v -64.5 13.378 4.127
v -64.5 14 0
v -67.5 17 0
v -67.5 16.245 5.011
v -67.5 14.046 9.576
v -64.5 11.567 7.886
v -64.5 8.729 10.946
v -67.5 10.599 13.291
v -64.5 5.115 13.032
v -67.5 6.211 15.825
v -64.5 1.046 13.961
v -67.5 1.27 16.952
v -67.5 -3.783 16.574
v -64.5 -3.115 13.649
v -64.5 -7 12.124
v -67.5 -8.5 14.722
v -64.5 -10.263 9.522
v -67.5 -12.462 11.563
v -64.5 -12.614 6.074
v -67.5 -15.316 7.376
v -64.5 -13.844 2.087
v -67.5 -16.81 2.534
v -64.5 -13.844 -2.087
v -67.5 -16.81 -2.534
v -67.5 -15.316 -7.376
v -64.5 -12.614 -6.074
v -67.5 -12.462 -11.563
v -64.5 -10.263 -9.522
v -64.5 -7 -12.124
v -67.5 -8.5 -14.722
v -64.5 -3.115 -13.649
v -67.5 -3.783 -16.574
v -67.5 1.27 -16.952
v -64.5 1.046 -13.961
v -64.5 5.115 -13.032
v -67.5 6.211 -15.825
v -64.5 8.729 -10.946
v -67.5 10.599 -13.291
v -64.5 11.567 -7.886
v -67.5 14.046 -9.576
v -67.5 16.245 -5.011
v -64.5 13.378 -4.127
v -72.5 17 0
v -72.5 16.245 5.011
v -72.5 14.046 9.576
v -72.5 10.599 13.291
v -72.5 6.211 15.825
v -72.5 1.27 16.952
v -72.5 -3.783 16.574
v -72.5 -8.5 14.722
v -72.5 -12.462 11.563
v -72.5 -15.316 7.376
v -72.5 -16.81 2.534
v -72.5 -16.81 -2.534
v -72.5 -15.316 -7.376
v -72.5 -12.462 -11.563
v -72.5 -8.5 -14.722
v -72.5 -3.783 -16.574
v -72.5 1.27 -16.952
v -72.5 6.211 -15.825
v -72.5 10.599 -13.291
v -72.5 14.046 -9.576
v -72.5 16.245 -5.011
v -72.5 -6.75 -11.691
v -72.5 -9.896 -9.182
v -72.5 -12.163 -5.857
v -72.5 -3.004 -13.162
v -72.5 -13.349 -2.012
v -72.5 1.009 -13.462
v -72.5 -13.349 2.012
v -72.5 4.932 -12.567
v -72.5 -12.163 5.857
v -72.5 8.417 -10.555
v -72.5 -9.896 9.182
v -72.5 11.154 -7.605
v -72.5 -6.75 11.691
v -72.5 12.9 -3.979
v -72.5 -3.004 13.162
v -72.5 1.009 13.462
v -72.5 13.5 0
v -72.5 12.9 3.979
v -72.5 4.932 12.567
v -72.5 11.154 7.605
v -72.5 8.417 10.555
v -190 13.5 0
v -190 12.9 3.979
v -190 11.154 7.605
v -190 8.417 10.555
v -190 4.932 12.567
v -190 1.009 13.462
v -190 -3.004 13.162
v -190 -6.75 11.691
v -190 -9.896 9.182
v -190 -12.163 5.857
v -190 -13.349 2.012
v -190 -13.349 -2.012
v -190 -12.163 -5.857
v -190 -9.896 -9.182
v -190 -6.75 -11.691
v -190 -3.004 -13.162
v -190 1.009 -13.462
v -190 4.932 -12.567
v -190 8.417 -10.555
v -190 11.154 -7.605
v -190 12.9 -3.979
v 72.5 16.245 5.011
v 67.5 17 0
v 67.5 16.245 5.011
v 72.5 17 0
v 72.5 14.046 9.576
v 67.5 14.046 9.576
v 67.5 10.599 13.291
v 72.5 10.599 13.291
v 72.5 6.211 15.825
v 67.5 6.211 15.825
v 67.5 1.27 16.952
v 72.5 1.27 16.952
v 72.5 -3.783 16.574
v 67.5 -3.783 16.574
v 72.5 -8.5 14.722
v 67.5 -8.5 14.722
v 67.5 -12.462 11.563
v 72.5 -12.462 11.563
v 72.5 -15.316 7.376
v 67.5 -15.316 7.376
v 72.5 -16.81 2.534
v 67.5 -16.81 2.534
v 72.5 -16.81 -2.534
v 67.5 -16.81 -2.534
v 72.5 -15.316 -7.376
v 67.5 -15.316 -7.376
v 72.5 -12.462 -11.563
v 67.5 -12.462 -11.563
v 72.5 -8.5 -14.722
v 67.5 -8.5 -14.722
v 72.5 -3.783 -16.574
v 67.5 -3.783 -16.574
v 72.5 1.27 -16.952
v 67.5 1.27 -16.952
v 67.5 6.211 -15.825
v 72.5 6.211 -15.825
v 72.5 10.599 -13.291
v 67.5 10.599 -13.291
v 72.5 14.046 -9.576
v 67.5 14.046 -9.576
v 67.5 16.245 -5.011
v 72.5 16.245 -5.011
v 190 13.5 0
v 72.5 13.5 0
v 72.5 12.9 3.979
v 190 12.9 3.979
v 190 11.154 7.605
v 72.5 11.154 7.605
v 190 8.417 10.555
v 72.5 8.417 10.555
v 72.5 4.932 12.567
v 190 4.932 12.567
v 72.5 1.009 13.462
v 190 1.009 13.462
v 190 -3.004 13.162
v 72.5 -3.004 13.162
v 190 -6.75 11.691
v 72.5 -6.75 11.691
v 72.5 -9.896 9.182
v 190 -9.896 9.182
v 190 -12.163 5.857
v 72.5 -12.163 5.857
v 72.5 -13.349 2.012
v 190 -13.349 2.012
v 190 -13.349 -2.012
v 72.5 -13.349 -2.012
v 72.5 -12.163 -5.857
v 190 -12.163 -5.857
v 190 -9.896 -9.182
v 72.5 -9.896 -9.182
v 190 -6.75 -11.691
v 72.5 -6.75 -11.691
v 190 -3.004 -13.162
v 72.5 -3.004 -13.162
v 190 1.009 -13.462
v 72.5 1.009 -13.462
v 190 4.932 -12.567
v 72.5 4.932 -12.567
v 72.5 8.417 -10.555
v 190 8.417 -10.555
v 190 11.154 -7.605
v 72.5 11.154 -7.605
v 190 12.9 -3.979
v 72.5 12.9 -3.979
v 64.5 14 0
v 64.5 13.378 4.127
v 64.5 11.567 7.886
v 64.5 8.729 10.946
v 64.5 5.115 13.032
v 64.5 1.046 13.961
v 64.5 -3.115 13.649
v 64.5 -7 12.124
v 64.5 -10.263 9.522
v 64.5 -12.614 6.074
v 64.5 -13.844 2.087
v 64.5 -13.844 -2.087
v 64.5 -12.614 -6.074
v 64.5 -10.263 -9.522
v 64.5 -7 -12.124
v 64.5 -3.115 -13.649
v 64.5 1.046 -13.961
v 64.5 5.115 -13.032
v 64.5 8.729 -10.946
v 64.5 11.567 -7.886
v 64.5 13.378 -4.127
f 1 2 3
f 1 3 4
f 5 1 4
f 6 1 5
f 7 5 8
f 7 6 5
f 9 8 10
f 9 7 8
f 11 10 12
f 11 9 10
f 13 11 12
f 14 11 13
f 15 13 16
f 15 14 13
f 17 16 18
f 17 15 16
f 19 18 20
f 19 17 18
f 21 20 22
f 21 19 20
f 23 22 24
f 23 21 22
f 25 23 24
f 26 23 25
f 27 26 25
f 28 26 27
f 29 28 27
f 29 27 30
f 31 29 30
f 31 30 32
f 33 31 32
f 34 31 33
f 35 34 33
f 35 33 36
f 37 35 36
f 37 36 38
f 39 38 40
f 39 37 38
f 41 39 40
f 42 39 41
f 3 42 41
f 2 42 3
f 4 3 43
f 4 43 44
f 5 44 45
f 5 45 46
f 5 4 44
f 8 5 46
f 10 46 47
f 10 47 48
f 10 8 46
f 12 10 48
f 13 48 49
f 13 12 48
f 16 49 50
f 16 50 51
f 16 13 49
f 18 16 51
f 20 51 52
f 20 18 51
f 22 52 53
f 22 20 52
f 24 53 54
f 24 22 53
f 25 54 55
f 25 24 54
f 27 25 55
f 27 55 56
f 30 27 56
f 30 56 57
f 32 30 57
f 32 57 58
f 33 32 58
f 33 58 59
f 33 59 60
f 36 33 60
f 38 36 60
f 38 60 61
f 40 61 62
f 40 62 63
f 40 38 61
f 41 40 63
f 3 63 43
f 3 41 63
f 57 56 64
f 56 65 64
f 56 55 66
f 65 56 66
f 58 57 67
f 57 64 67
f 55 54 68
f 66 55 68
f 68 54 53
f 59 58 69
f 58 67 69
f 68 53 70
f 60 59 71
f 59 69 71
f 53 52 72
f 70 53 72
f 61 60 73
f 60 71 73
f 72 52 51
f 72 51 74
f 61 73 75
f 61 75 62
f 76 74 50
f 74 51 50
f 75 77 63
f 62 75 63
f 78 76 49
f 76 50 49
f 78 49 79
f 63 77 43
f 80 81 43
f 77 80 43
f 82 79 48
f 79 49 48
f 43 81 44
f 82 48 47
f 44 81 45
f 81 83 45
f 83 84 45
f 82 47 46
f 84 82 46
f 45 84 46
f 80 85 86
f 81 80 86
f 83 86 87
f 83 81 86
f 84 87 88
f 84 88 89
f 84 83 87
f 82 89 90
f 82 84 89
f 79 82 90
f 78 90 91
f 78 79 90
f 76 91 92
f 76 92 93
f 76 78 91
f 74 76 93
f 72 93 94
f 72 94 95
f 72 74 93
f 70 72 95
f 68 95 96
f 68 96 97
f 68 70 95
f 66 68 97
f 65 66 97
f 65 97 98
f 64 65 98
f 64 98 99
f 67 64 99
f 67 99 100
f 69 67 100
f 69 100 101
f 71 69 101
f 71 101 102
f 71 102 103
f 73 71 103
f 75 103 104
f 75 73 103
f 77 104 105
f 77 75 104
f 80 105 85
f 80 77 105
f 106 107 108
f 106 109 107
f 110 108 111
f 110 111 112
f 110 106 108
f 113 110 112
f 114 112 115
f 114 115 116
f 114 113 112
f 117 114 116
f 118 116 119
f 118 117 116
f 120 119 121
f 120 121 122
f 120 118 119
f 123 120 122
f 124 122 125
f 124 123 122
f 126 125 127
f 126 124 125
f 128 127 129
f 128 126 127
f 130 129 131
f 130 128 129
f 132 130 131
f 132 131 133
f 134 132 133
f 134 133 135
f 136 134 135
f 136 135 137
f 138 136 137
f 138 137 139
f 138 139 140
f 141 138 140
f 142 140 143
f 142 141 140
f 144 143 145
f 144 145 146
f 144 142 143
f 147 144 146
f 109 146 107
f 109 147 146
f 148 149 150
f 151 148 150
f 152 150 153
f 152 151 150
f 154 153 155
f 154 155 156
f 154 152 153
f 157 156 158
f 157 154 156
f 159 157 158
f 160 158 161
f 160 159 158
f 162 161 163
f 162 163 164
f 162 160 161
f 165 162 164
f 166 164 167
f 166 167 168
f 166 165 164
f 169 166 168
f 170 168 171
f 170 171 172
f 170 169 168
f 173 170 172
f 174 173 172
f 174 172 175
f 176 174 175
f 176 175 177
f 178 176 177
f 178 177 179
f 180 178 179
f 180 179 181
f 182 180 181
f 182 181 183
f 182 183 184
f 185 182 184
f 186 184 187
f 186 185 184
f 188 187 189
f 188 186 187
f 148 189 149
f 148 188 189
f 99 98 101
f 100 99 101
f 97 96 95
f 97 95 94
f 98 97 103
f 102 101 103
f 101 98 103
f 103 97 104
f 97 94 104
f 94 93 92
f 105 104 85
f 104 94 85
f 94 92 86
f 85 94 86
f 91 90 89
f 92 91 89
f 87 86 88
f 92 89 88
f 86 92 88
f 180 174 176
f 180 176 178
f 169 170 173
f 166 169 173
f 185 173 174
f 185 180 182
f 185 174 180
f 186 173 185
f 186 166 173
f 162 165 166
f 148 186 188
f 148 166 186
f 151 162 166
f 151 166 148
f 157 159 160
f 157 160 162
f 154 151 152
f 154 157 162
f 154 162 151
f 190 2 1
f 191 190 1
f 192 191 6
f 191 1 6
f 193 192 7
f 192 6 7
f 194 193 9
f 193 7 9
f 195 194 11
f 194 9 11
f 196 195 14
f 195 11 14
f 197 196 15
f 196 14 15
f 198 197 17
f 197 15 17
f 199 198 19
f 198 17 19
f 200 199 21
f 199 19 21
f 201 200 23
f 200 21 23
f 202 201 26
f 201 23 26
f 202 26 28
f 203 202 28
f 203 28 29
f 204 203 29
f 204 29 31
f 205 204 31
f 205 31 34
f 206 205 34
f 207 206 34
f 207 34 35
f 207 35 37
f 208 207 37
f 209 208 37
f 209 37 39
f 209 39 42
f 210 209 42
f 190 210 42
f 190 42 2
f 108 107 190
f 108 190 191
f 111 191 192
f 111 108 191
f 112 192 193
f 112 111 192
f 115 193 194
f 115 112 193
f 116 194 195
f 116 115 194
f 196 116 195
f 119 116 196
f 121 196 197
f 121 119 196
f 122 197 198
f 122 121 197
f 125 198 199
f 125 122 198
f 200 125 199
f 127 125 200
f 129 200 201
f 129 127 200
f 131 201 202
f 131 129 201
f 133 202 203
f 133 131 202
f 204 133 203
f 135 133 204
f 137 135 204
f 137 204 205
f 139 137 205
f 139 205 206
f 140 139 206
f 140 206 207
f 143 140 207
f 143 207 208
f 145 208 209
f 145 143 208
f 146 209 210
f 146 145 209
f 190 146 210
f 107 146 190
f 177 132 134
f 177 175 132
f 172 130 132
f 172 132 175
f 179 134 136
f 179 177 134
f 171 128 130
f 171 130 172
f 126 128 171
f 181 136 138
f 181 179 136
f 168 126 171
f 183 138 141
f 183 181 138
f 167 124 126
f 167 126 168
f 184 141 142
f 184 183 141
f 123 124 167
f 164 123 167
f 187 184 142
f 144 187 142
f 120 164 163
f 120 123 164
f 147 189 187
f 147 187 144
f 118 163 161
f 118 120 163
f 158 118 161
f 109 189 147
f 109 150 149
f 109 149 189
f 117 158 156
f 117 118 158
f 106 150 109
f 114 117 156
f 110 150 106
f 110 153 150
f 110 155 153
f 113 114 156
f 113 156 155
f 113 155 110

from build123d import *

# Parameters (mm, degrees)
F0_R     = 13.5
F1_DEPTH = 190
F2_R     = 17
F3_DEPTH = 72.5
F4_R     = 17.5
F4_R_2   = 14
F5_DEPTH = 67.5
F6_SIZE  = 2.99999


# Not quite as in the source:
# - a fillet or chamfer is up to 0.001 mm smaller than in the source, because OpenCascade refuses the exact size


with BuildPart() as f1:
    # F0 (on Right) → F1 (new body, symmetric)
    with BuildSketch(Plane.YZ):
        Circle(F0_R)
    extrude(amount=F1_DEPTH, both=True)

    # F2 (on Right) → F3 (join, symmetric)
    with BuildSketch(Plane.YZ):
        Circle(F2_R)
    extrude(amount=F3_DEPTH, both=True)

    # F4 (on Right) → F5 (cut, symmetric)
    with BuildSketch(Plane.YZ):
        Circle(F4_R)
        Circle(F4_R_2, mode=Mode.SUBTRACT)
    extrude(amount=F5_DEPTH, both=True, mode=Mode.SUBTRACT)

    # F6 (size 3 in the source; OpenCascade refuses exactly that, so slightly less here)
    f6_edges = [f1.edges().sort_by_distance(p)[0] for p in [
        (-67.5, -14, 0),
        (67.5, -14, 0),
    ]]
    chamfer(f6_edges, length=F6_SIZE)


solid = f1.part
